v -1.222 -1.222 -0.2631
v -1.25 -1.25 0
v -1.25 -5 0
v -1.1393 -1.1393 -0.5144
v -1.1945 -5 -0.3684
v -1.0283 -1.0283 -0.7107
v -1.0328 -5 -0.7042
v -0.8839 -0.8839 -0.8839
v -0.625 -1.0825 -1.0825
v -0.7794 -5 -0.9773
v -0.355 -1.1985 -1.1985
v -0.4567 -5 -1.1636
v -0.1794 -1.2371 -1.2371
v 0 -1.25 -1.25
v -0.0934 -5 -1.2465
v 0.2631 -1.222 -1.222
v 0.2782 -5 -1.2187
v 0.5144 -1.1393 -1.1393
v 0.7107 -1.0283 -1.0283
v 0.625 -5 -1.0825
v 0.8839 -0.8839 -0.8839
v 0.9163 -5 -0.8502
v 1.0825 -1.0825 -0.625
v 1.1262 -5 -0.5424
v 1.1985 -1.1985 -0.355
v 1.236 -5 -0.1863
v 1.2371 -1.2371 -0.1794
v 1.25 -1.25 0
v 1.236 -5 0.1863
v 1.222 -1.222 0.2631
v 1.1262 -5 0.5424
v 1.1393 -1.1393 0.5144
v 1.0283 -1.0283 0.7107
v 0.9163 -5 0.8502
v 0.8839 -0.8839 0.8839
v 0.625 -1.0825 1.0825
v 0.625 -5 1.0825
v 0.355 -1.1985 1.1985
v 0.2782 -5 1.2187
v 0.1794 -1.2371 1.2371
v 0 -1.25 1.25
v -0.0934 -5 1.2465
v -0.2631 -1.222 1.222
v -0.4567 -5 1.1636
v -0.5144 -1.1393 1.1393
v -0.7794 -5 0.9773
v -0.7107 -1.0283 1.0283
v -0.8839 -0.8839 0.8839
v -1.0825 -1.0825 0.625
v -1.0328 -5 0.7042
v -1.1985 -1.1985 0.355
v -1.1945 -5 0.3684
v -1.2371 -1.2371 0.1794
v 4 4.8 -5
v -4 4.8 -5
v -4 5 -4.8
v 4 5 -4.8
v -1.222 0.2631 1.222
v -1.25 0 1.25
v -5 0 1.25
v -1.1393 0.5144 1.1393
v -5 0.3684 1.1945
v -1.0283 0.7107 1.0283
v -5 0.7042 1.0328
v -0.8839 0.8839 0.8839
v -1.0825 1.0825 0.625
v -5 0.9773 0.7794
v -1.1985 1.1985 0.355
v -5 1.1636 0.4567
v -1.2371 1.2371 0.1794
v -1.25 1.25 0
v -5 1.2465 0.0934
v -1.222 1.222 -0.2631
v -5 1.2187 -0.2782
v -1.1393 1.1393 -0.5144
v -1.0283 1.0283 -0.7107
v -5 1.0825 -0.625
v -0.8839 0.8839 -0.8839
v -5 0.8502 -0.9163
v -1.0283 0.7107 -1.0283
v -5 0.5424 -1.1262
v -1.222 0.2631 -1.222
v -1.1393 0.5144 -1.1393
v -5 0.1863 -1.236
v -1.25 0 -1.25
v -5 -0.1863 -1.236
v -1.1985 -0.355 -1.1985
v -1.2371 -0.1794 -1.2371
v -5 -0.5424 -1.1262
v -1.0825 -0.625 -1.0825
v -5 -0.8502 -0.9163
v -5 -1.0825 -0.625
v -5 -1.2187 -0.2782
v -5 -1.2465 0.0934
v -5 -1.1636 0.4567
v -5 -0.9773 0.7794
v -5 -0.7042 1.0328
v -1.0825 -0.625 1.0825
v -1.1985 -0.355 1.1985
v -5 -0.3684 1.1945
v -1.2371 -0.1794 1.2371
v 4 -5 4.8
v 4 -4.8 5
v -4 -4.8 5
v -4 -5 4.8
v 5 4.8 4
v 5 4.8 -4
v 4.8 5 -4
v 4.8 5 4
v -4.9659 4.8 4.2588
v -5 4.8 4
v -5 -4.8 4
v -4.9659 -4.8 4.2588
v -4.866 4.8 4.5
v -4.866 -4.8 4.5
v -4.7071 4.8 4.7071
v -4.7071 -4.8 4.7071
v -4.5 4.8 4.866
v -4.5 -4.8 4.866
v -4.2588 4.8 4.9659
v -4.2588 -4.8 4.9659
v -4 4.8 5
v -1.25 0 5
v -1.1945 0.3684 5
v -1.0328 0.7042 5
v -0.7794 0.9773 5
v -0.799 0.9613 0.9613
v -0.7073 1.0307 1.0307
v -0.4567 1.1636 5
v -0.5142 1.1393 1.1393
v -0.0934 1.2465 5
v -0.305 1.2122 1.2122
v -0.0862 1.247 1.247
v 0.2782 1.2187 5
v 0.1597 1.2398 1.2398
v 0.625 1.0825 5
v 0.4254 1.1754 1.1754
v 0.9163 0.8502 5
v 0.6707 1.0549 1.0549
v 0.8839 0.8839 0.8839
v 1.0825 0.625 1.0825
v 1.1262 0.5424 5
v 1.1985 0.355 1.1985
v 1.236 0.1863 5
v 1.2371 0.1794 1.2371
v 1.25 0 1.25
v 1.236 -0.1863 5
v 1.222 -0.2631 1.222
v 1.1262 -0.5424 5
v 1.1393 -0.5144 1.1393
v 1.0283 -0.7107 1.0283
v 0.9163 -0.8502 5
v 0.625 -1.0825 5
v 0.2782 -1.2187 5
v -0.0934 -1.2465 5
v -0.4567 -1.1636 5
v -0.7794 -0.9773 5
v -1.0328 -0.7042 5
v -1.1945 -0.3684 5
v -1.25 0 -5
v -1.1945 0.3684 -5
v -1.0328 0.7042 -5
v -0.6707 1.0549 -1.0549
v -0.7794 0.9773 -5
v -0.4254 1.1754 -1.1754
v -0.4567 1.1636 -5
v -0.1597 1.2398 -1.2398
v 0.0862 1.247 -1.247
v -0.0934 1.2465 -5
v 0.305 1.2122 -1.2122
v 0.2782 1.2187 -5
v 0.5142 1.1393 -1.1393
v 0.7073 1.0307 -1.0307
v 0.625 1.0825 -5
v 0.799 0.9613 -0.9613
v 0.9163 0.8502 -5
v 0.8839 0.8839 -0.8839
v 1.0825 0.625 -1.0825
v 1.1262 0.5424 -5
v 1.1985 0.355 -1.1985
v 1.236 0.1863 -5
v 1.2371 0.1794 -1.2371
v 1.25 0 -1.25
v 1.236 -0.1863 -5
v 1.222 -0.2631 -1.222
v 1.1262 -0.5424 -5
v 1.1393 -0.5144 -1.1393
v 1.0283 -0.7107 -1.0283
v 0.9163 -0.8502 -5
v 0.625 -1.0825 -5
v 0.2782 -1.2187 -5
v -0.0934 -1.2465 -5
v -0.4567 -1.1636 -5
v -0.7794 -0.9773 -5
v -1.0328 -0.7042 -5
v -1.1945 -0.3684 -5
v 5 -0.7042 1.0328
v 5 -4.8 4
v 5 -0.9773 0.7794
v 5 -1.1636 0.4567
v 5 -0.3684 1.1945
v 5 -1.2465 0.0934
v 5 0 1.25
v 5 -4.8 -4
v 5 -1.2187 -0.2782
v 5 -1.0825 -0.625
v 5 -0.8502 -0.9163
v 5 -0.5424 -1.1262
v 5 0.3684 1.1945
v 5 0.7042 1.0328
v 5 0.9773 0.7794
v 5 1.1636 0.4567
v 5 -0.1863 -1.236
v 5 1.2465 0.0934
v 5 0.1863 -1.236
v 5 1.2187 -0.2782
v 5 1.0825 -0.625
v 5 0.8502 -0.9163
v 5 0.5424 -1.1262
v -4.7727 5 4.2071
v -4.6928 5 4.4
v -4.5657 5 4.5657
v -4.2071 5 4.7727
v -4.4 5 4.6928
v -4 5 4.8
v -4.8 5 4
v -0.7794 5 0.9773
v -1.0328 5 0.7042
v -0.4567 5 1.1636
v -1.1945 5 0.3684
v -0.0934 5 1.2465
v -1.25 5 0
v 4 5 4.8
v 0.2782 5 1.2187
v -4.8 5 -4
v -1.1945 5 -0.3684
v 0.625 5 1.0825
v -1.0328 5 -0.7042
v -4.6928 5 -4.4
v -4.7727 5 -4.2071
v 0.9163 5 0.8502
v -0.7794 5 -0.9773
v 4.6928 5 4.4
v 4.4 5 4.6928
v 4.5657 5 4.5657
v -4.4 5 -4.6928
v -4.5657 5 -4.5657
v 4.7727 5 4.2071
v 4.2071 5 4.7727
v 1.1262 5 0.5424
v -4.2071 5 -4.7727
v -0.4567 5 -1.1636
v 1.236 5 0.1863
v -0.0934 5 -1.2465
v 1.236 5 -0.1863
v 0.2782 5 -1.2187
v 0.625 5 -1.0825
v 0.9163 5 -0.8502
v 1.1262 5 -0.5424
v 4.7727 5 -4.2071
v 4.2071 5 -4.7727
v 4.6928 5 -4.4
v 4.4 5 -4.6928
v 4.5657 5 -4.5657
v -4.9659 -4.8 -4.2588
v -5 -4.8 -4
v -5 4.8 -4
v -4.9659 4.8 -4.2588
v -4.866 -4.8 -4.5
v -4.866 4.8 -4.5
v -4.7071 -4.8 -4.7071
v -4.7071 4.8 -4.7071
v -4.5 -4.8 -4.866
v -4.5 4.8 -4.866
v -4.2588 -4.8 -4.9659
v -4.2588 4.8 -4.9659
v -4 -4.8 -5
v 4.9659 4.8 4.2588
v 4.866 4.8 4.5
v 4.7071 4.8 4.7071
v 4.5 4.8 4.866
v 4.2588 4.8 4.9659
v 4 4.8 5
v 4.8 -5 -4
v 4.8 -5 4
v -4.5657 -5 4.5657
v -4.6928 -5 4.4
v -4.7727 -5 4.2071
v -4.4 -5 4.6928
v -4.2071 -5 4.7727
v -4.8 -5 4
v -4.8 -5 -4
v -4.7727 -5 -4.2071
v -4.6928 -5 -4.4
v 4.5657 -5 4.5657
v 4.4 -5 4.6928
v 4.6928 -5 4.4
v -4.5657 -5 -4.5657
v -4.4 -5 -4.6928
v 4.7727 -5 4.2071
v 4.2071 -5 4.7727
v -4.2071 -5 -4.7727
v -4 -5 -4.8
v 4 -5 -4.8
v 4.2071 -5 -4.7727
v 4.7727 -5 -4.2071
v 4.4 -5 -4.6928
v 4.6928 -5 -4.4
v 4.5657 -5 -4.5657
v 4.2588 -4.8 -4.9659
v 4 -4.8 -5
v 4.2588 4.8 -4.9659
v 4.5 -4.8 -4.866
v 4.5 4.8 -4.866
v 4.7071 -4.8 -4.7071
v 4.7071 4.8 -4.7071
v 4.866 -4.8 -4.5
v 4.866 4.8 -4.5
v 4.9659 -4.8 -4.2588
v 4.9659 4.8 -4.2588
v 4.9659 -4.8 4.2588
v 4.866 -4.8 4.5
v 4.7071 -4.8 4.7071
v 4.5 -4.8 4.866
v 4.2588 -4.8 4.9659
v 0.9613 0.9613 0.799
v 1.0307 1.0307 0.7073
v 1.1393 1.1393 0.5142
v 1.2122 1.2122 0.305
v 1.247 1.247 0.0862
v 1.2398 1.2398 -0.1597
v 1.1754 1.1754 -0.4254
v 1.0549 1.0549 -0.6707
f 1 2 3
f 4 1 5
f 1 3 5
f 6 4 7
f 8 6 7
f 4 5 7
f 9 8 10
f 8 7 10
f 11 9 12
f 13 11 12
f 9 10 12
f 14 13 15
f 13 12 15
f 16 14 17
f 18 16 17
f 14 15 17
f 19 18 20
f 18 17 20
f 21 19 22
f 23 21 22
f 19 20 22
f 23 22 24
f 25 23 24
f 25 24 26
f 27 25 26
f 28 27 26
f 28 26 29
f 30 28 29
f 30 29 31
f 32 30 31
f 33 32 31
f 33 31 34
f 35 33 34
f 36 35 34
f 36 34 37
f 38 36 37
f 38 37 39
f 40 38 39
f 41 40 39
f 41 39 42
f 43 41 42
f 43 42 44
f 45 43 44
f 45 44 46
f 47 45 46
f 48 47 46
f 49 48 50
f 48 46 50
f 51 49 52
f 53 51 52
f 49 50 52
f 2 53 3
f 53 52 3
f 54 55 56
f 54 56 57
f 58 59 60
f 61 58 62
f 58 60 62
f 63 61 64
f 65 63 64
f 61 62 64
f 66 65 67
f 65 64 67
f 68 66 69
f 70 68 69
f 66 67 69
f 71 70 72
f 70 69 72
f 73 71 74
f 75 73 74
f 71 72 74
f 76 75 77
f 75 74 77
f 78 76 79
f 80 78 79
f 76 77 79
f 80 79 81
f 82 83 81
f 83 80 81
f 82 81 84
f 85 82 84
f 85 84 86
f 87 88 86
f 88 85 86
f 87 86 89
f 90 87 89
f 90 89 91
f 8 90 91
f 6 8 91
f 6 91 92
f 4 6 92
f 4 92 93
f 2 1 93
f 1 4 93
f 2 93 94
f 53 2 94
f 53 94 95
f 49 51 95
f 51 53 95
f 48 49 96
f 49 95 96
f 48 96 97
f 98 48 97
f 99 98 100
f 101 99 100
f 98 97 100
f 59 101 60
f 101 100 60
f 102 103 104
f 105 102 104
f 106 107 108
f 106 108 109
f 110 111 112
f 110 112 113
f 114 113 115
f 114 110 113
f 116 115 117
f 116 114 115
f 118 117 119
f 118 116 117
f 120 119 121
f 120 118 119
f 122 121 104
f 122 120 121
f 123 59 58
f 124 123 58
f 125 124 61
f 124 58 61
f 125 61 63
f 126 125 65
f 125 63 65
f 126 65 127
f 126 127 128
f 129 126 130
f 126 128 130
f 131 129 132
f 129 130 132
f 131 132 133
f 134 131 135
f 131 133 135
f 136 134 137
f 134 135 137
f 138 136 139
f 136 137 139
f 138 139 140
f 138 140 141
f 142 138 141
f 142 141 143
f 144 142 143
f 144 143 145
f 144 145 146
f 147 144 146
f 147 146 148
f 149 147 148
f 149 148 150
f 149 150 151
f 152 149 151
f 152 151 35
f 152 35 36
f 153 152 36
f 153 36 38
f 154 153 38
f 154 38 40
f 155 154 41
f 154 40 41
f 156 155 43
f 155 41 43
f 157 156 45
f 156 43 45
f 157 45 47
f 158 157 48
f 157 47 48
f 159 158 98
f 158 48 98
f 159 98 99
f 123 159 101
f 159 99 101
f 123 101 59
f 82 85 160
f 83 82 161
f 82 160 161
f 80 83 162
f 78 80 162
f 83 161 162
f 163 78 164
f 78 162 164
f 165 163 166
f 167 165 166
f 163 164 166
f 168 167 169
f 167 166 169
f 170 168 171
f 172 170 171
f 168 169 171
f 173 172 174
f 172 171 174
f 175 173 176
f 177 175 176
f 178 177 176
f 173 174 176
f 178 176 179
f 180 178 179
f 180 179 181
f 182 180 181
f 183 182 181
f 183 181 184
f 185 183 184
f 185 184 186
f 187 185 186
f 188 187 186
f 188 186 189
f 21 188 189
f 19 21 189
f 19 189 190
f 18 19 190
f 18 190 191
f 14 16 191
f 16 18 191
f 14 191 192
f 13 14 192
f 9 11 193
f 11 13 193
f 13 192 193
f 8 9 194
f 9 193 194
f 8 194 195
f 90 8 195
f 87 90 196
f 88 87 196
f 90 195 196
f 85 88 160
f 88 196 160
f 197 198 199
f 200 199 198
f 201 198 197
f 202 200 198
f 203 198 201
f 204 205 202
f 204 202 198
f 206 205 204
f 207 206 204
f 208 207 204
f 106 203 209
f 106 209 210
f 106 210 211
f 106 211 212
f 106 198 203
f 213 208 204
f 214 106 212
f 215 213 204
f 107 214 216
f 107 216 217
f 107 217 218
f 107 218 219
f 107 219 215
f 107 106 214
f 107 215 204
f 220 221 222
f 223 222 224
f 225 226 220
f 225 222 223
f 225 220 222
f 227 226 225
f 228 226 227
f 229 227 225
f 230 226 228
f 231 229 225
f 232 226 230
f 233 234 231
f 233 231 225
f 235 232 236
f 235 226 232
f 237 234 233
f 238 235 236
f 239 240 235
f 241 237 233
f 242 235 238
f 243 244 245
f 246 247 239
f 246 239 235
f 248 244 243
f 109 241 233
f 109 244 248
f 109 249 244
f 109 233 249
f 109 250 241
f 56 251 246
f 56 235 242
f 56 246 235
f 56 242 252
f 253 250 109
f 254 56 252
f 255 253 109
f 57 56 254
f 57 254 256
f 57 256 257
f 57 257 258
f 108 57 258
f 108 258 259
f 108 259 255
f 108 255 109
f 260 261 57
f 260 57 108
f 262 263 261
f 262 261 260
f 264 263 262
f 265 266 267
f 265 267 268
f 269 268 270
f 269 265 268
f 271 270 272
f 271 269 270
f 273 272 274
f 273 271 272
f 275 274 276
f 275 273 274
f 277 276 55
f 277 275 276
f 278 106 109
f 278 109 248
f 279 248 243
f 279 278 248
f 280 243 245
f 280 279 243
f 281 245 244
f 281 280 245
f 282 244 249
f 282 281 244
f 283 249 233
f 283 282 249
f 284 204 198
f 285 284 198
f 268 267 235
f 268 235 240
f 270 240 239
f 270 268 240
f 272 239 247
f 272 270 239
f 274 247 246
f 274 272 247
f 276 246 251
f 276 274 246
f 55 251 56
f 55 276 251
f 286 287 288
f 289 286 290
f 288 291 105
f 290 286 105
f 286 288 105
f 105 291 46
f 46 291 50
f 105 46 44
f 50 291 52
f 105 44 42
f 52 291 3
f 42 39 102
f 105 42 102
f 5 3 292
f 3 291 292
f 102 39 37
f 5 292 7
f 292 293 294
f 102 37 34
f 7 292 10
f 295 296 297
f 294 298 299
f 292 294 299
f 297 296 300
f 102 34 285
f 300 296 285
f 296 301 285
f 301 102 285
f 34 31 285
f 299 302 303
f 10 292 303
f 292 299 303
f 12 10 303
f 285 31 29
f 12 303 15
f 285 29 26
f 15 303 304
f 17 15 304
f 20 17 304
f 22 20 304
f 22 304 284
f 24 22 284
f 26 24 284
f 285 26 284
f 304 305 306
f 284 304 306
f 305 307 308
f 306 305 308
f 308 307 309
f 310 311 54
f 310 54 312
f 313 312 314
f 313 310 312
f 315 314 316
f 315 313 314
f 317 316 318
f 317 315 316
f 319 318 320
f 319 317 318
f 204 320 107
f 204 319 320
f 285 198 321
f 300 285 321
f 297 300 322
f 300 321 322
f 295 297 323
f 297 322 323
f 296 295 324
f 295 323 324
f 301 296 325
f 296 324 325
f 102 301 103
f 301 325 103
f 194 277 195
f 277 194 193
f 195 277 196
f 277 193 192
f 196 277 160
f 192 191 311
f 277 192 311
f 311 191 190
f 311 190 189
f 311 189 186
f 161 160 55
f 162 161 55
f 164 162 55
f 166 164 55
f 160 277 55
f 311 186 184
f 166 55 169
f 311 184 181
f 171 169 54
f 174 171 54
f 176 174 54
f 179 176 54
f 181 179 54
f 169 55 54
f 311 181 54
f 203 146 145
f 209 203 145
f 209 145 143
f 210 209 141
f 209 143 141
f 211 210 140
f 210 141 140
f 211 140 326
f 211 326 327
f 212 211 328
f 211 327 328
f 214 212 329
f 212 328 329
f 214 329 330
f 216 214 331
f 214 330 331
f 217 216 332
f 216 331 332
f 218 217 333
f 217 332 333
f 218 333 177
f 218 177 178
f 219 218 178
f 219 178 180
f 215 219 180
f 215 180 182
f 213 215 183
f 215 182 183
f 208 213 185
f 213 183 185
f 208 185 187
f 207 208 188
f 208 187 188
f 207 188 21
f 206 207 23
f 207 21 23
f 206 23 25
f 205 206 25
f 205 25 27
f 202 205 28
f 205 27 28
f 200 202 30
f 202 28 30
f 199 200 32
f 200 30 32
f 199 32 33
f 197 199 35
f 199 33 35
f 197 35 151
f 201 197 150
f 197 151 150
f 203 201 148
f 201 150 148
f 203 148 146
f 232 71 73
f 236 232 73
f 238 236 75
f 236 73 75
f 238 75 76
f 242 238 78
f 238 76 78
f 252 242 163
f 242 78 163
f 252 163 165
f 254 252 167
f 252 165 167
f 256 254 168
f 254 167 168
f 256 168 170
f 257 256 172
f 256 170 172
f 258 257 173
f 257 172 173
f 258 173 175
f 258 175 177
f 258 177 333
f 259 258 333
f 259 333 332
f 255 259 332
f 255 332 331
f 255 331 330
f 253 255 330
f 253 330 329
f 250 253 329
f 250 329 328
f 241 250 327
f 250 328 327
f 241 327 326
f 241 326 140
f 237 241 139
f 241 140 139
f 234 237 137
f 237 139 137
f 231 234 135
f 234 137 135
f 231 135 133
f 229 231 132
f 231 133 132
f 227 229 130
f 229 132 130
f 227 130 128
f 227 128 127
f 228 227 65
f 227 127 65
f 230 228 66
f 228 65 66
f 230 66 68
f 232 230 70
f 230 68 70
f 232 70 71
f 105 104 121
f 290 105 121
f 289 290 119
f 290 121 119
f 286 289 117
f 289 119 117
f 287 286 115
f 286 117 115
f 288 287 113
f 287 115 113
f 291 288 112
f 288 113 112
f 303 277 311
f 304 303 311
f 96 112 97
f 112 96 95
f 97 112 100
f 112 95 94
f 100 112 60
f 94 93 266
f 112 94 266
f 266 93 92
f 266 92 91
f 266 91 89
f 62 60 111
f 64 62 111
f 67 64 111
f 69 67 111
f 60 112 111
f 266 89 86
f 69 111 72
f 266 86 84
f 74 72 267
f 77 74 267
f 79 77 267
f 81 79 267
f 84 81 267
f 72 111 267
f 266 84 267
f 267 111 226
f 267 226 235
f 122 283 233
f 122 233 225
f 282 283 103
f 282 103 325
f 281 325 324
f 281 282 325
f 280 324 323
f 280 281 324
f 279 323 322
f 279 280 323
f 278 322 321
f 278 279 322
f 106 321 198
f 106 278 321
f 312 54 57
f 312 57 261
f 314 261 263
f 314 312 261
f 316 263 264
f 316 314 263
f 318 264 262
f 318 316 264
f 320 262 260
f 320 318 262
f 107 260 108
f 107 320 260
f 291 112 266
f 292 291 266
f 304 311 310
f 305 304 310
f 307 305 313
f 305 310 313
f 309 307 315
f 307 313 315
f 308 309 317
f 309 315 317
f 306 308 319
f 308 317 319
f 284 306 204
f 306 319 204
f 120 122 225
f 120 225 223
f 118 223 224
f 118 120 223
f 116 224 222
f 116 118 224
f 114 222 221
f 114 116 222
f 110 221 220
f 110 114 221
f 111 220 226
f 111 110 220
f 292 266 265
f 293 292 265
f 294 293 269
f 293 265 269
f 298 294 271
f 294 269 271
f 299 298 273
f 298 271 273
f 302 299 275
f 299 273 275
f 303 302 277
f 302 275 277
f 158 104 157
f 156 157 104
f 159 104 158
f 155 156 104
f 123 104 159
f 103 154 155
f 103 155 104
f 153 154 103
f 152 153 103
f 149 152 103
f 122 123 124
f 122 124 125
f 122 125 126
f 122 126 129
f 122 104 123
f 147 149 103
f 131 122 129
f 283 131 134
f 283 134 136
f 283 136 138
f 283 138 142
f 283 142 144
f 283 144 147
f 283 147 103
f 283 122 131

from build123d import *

# Parameters (mm, degrees)
SKETCH_1_W         = 10
SKETCH_1_H         = 10
EXTRUDE_1_DEPTH    = 5
HOLE_WIZARD_M3_1_D = 2.5
HOLE_WIZARD_M3_2_D = 2.5
HOLE_WIZARD_M3_3_D = 2.5
FILLET_1_R         = 1
CHAMFER_1_SIZE     = 0.2


with BuildPart() as part:
    # 草图1 → 凸台-拉伸1 (new body, symmetric)
    with BuildSketch(Plane(origin=(0, 0, 0), x_dir=(1, 0, 0), z_dir=(0, 1, 0))):
        Rectangle(SKETCH_1_W, SKETCH_1_H)
    extrude(amount=EXTRUDE_1_DEPTH, both=True)

    # M3 螺纹孔1 (through all)
    with Locations(Plane(origin=(0, 5, 0), x_dir=(1, 0, 0), z_dir=(0, 1, 0))):
        with Locations((0, 0)):
            Hole(HOLE_WIZARD_M3_1_D / 2)

    # M3 螺纹孔2 (through all)
    with Locations(Plane.XY.offset(5)):
        with Locations((0, 0)):
            Hole(HOLE_WIZARD_M3_2_D / 2)

    # M3 螺纹孔3 (through all)
    with Locations(Plane(origin=(5, 0, 0), x_dir=(0, 0, -1), z_dir=(1, 0, 0))):
        with Locations((0, 0)):
            Hole(HOLE_WIZARD_M3_3_D / 2)

    # 圆角1
    fillet_1_edges = [part.edges().sort_by_distance(p)[0] for p in [
        (5, 0, 5),
        (-5, 0, 5),
        (-5, 0, -5),
        (5, 0, -5),
    ]]
    fillet(fillet_1_edges, radius=FILLET_1_R)

    # 倒角1
    chamfer_1_edges = [part.edges().sort_by_distance(p)[0] for p in [
        (0, -5, -5),
        (0, 5, -5),
        (5, -5, 0),
        (0, -5, 5),
        (-5, -5, 0),
        (-4.707106781, -5, -4.707106781),
        (-4.707106781, -5, 4.707106781),
        (4.707106781, -5, 4.707106781),
        (4.707106781, -5, -4.707106781),
        (5, 5, 0),
        (-5, 5, 0),
        (0, 5, 5),
        (-4.707106781, 5, -4.707106781),
        (-4.707106781, 5, 4.707106781),
        (4.707106781, 5, 4.707106781),
        (4.707106781, 5, -4.707106781),
    ]]
    chamfer(chamfer_1_edges, length=CHAMFER_1_SIZE)


solid = part.part
